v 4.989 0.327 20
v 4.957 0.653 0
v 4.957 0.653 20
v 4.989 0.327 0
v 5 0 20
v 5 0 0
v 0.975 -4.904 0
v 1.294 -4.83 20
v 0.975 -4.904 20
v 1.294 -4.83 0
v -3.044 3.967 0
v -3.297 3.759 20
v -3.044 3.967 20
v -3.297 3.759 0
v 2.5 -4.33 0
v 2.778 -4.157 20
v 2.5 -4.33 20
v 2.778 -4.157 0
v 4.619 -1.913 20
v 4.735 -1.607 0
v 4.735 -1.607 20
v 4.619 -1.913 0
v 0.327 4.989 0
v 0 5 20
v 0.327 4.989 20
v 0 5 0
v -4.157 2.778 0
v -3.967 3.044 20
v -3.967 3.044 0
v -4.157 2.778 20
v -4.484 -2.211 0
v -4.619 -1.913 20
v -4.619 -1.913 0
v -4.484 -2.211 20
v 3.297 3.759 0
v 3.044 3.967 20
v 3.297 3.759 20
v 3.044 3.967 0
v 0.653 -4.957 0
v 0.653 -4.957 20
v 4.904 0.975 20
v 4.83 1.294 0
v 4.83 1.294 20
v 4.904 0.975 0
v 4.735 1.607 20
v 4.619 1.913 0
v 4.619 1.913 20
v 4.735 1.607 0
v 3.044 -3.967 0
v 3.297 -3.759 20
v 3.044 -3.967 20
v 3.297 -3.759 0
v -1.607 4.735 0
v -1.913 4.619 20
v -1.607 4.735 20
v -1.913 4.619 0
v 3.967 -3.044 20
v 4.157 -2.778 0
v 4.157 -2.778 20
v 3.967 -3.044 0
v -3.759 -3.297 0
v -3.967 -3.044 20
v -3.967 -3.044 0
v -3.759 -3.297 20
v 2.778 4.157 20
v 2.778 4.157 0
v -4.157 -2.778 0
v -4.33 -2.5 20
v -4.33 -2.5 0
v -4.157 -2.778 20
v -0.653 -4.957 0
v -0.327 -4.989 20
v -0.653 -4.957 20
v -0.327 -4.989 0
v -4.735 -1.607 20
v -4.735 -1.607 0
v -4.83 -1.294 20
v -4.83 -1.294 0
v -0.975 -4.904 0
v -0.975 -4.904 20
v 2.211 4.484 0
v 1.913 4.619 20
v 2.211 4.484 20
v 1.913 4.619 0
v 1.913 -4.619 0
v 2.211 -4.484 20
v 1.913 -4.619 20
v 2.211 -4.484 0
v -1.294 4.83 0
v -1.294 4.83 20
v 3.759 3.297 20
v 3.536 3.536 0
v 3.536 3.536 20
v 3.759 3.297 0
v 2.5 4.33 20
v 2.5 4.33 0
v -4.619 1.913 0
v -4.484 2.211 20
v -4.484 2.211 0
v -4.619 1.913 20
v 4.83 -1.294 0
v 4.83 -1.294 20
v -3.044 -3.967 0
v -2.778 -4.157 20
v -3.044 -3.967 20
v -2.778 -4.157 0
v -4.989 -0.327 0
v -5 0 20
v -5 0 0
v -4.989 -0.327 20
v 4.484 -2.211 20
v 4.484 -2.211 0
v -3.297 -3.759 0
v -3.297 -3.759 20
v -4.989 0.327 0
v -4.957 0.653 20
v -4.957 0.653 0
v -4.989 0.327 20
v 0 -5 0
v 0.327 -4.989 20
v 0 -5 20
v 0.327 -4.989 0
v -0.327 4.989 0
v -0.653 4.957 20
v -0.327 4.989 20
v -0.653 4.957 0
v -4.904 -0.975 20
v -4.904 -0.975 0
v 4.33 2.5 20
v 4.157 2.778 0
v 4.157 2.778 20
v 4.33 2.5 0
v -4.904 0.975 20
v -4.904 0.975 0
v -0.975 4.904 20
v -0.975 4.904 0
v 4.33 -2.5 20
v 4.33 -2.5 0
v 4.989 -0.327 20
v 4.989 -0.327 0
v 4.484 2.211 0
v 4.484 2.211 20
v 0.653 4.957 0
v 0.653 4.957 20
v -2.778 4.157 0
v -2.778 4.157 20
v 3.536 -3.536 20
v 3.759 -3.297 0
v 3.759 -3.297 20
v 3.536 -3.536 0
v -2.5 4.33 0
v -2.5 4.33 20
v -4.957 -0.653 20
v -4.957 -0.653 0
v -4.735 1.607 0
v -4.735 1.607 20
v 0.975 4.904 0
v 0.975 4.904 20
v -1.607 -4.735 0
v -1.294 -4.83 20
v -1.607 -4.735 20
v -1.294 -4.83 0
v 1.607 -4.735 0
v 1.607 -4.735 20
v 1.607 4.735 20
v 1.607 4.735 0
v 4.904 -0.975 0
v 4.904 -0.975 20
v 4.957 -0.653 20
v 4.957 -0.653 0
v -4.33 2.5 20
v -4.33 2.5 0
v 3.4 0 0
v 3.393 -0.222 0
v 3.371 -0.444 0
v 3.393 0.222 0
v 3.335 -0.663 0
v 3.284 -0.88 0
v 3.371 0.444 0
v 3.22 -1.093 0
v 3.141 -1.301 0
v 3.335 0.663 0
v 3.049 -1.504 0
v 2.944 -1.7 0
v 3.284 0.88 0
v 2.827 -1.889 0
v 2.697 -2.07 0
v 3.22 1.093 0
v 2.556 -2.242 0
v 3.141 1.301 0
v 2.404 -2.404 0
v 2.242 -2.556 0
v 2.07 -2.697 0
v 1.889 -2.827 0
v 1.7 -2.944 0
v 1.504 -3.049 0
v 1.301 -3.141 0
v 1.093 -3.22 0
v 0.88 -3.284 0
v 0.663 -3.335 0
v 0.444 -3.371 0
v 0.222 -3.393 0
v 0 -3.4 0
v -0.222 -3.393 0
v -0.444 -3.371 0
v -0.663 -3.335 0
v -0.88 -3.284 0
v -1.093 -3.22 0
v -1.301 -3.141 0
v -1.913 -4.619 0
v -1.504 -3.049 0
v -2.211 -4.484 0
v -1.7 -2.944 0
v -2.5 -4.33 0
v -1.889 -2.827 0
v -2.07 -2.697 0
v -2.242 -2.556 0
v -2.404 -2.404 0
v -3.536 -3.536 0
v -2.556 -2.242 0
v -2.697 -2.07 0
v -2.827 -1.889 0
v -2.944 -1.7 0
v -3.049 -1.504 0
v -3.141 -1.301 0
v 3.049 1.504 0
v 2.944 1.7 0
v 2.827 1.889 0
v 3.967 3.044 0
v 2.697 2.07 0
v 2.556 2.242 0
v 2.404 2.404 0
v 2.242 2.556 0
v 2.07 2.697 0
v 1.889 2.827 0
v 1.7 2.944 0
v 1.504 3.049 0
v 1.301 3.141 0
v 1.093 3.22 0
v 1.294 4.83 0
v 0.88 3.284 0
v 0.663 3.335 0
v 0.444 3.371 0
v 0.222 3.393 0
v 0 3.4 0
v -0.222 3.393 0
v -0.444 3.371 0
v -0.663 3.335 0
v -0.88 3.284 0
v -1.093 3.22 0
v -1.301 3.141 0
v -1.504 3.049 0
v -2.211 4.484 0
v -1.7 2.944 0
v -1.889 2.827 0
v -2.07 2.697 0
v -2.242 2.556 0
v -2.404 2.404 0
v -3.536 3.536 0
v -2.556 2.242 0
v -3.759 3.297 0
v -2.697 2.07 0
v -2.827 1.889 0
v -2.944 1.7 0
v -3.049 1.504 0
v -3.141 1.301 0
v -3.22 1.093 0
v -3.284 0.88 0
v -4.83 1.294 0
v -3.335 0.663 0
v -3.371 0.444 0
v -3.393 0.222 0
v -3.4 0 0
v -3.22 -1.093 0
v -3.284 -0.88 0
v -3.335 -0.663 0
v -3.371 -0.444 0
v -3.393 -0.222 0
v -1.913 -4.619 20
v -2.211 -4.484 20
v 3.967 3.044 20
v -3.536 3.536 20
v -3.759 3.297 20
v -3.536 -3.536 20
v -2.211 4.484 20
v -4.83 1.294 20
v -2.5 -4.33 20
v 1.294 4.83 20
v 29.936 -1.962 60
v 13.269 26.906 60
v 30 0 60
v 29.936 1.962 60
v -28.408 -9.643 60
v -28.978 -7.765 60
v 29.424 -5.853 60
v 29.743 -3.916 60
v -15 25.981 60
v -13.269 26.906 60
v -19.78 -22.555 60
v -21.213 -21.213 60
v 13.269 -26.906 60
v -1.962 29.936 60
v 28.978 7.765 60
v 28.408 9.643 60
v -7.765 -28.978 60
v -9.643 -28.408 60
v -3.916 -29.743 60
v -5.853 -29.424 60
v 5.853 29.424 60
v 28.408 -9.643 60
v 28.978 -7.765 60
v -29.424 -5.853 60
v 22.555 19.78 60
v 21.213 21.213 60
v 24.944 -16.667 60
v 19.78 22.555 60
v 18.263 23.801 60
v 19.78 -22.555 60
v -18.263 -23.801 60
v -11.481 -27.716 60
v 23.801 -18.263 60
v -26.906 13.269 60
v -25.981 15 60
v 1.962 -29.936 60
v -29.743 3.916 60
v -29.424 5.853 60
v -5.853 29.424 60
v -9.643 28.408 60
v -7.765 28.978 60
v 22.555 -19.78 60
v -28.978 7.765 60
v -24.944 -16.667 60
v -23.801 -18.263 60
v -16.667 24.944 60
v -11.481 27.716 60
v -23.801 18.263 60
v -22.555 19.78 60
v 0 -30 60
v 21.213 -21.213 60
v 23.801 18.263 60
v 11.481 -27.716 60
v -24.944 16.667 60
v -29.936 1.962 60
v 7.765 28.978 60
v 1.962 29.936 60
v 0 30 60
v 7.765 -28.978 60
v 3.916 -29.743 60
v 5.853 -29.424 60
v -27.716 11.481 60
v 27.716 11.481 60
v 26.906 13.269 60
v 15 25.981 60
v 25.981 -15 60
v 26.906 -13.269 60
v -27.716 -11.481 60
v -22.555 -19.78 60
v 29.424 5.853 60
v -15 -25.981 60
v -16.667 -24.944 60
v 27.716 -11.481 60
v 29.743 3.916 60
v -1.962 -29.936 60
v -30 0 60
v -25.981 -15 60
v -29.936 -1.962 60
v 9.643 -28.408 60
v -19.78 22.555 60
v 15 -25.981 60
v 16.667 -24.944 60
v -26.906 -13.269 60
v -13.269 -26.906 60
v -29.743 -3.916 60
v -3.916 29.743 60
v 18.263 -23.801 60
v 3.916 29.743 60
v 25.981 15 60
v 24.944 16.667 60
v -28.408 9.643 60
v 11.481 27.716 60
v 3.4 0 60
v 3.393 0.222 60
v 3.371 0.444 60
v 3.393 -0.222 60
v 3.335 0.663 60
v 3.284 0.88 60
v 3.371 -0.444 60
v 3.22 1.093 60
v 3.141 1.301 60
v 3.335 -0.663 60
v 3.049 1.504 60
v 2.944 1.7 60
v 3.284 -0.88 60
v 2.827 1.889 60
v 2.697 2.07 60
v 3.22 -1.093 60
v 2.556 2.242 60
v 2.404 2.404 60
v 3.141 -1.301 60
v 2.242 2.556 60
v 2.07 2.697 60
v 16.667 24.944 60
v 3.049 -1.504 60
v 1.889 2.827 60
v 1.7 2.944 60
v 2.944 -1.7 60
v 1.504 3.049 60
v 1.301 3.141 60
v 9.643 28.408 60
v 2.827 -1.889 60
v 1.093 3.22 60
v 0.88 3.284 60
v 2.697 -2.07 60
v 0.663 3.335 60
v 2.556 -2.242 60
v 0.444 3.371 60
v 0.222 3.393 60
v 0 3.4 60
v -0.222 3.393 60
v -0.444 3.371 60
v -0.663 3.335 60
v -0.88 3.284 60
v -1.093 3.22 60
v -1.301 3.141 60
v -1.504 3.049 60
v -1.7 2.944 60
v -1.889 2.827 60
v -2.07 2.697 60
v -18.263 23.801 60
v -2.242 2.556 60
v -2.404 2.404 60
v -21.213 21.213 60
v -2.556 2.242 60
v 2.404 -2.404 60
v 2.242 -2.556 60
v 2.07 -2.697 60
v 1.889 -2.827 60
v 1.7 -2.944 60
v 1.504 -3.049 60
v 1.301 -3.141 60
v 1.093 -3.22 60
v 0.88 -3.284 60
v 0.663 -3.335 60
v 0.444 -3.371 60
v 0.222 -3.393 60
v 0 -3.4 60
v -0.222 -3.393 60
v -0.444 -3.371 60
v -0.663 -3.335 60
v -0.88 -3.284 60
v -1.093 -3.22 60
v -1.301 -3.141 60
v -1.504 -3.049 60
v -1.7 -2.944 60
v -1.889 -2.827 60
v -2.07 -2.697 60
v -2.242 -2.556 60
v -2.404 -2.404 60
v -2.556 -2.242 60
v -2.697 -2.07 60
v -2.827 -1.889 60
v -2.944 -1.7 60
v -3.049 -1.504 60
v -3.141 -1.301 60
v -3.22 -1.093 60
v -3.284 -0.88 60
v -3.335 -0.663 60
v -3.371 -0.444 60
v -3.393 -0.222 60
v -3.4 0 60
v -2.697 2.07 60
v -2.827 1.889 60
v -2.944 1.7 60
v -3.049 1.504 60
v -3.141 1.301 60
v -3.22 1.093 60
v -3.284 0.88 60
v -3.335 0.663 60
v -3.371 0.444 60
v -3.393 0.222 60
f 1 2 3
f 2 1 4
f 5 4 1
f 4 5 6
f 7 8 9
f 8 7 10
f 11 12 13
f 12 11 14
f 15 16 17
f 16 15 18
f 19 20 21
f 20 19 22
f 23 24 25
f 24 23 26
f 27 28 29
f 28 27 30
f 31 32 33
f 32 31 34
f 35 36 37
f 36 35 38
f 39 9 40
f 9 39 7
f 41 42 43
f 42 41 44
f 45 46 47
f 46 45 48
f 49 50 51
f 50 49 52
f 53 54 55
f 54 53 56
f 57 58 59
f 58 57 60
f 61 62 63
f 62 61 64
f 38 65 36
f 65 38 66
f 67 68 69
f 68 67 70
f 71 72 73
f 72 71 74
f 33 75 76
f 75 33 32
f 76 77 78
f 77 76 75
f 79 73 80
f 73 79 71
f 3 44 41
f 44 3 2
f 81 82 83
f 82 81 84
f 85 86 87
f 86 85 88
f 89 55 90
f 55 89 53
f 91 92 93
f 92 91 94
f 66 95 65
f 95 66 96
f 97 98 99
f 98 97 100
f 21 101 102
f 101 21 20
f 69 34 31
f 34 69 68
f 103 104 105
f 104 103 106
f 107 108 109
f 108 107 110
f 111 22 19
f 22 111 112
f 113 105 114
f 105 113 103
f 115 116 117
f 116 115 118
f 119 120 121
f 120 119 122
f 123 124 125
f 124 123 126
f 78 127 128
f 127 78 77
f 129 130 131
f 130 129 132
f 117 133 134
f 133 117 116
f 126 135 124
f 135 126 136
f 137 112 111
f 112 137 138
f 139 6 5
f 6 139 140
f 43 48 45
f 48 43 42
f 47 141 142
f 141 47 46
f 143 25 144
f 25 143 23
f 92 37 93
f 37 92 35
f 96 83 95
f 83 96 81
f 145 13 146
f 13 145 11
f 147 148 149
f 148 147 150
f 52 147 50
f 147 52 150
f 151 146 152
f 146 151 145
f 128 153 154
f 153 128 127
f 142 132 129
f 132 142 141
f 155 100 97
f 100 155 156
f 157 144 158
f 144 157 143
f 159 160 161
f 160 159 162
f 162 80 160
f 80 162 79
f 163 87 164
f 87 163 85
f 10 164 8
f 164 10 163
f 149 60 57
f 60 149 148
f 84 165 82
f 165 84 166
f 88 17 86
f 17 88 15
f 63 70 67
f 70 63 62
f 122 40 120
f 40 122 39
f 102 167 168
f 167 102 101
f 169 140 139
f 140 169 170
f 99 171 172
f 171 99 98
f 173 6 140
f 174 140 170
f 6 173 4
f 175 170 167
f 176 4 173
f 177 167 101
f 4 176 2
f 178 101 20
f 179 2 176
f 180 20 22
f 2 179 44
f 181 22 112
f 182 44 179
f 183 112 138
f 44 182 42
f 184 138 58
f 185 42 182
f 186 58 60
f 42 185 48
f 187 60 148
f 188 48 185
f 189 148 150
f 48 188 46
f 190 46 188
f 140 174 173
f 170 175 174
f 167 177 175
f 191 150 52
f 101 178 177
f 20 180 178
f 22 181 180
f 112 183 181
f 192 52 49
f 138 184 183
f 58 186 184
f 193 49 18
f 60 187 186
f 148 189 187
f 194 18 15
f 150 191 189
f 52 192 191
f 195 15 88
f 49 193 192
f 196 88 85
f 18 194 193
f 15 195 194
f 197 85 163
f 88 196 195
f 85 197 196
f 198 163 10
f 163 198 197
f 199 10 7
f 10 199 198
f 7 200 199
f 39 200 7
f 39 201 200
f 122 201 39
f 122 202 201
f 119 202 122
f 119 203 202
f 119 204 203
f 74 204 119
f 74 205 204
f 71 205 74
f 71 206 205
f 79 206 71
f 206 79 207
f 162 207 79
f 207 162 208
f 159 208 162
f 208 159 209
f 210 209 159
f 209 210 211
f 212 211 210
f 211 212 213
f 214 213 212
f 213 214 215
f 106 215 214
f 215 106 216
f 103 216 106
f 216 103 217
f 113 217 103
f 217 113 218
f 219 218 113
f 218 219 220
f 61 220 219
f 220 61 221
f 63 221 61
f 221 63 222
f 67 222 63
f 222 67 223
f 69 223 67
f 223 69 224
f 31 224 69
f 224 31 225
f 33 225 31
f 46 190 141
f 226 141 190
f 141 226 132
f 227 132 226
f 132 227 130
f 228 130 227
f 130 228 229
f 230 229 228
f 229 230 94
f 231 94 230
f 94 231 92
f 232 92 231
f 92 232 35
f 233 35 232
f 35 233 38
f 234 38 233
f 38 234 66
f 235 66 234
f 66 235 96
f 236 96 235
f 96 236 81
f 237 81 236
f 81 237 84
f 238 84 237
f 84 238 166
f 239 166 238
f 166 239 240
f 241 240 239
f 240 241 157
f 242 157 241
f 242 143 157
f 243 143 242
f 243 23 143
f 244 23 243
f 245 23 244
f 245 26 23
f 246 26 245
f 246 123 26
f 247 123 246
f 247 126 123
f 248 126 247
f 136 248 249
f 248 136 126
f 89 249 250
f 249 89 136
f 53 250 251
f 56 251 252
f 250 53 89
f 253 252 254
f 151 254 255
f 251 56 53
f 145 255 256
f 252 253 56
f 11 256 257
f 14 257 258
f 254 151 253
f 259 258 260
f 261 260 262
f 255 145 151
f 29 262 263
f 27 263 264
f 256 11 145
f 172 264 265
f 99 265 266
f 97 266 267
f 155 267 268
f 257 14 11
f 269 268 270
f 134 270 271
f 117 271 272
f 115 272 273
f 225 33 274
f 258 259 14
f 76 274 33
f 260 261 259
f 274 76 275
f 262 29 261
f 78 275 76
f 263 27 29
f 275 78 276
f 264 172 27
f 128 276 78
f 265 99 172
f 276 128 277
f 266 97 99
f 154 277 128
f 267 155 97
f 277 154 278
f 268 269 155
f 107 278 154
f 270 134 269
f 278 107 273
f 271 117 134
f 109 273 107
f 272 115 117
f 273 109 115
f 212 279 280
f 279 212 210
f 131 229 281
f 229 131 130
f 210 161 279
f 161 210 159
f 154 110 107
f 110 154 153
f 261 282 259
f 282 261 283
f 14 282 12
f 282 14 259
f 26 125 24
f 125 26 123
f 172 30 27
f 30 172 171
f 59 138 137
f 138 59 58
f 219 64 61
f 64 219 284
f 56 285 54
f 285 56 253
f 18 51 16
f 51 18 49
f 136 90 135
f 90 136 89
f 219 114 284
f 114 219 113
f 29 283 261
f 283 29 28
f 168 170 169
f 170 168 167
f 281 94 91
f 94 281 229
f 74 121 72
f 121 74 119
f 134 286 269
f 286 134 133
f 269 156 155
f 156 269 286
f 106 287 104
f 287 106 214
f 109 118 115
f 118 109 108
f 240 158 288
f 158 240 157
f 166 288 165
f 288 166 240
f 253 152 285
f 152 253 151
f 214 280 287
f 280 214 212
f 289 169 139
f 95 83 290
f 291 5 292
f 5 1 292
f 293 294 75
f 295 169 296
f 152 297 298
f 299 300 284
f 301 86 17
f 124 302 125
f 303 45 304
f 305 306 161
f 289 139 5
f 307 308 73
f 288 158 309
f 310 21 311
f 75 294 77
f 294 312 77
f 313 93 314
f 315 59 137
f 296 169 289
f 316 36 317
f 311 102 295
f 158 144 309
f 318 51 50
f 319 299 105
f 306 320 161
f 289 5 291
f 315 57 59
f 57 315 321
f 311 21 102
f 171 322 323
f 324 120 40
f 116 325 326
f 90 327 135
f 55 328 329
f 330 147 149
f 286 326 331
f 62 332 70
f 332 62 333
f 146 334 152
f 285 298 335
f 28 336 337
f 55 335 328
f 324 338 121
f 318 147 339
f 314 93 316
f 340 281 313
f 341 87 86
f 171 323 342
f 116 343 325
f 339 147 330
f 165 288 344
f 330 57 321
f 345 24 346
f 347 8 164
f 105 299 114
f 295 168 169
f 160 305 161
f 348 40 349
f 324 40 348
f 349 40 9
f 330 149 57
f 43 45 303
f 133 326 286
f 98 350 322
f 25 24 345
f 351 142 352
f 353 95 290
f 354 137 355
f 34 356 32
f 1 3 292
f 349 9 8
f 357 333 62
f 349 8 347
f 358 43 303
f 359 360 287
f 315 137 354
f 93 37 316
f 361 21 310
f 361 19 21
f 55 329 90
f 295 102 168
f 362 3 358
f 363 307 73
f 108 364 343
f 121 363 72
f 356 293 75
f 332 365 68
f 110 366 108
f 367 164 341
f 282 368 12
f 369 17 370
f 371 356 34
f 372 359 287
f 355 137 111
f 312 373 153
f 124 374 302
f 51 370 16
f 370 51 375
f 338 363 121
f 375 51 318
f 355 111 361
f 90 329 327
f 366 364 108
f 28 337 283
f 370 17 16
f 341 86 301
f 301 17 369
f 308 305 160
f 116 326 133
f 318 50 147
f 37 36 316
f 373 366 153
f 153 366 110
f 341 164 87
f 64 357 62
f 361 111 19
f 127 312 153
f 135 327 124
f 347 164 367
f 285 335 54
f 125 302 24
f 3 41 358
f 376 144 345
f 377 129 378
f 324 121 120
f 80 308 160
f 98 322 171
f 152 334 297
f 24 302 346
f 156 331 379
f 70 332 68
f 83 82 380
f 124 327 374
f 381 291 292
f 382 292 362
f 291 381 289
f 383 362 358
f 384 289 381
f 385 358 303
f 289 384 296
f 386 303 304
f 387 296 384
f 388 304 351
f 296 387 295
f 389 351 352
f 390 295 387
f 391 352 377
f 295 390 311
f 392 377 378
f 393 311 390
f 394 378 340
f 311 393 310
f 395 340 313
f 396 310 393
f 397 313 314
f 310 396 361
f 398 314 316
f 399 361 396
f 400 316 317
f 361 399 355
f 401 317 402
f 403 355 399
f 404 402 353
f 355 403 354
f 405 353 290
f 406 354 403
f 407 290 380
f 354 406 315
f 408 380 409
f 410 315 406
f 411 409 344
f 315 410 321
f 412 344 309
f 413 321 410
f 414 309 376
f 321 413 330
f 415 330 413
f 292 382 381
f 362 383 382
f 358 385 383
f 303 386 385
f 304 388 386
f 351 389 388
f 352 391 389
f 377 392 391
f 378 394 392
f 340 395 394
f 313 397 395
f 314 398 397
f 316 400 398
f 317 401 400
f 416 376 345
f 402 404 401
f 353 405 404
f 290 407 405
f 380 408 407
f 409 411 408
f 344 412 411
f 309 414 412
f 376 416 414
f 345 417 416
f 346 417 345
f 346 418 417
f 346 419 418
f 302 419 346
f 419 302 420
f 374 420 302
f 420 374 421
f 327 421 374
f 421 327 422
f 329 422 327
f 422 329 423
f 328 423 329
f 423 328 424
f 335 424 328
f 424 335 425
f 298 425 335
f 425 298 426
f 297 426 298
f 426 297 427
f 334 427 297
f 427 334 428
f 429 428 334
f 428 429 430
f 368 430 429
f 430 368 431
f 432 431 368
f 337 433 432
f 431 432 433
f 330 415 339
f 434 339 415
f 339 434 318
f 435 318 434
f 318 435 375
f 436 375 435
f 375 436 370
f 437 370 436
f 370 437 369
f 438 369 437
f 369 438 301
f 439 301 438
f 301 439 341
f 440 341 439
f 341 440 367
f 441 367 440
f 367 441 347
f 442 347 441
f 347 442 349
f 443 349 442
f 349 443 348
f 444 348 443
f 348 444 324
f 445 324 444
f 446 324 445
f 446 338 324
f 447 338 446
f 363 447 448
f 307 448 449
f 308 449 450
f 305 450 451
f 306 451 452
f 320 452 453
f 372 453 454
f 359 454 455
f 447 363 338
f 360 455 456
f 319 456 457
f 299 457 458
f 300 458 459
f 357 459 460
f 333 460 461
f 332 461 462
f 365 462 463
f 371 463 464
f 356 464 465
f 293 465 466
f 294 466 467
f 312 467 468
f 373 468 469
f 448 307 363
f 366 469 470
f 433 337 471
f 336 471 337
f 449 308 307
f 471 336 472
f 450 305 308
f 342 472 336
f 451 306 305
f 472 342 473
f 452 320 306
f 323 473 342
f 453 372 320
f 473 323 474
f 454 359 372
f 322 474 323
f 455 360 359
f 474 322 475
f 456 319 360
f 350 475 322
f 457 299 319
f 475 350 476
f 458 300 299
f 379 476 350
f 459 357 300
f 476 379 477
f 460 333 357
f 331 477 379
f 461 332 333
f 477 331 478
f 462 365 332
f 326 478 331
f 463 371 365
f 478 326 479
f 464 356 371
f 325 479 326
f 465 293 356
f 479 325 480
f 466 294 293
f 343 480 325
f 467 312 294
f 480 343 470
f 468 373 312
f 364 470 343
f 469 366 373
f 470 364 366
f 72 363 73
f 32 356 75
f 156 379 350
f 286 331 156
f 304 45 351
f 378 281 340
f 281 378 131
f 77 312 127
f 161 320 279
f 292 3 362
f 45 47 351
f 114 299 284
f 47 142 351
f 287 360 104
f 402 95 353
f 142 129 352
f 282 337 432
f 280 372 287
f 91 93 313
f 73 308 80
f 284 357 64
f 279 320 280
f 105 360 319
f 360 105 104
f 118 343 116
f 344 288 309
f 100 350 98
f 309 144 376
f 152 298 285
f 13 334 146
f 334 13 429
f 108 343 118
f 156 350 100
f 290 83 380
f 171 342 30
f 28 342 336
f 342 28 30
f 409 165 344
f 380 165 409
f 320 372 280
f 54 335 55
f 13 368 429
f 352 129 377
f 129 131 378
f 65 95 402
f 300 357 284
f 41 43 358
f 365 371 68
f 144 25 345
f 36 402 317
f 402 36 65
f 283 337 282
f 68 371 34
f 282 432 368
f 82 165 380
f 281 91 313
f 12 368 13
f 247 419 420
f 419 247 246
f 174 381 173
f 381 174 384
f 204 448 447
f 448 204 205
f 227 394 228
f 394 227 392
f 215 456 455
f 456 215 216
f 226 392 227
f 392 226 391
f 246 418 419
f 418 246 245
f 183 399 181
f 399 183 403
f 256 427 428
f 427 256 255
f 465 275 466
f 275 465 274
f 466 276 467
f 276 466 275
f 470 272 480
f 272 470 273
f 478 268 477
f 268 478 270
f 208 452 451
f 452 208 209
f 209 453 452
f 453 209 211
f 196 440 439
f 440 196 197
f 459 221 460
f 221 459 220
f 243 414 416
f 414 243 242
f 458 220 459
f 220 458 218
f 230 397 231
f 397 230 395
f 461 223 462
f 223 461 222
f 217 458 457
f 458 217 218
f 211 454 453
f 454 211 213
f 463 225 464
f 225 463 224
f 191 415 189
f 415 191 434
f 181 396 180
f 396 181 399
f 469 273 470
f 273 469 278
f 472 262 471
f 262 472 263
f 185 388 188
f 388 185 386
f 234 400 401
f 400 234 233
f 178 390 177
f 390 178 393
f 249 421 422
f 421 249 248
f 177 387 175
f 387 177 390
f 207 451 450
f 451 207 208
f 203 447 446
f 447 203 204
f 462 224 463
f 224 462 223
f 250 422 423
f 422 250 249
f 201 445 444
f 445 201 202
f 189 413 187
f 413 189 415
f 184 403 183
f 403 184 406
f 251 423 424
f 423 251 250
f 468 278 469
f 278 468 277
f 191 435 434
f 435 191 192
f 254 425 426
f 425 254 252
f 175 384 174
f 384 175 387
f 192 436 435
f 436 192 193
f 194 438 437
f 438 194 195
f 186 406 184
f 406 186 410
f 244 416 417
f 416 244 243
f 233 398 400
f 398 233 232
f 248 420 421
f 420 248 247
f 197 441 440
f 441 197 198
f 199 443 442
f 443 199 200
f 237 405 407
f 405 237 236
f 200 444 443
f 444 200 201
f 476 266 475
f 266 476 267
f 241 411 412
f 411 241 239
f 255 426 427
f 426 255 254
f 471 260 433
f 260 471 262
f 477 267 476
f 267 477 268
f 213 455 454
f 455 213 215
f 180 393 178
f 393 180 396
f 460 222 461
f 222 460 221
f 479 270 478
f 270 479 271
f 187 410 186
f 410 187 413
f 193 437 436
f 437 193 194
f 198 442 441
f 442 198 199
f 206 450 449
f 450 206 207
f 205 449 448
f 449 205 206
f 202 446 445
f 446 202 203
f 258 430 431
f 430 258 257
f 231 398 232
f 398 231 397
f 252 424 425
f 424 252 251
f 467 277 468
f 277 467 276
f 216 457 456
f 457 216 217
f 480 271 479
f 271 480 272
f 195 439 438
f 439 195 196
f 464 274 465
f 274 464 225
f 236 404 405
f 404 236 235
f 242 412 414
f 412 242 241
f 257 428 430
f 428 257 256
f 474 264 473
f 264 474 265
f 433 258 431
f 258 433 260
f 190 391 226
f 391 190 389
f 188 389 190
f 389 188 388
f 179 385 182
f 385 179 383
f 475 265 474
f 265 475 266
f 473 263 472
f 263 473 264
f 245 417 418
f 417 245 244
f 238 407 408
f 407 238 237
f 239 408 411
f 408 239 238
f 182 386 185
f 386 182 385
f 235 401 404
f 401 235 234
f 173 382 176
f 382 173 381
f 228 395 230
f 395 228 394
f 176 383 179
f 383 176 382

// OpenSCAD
// Lab funnel - printed upright, open at top and bottom
// Units: mm

$fn = 96;

// --- Dimensions ---
spout_od      = 10;    // spout outer diameter
spout_id      = spout_od - 2 * 1.6;  // spout bore (6.8 mm)
spout_h       = 20;    // spout height (z = 0 to 20)
cone_bottom_d = spout_od;  // cone starts at spout diameter (z = 20)
cone_top_d    = 60;    // cone rim diameter (z = 50)
wall          = 1.6;   // uniform wall thickness
eps           = 0.5;   // cutter overshoot

difference() {
    union() {
        // Spout
        cylinder(d = spout_od, h = spout_h);
        // Cone
        translate([0, 0, spout_h])
            cylinder(d1 = cone_bottom_d, d2 = cone_top_d, h = cone_top_d - spout_h);
    }
    // Through-bore: spout + cone interior (extended past both faces)
    translate([0, 0, -eps])
        linear_extrude(height = spout_h + cone_top_d - spout_h + 2 * eps)
            circle(d = spout_id);
}
